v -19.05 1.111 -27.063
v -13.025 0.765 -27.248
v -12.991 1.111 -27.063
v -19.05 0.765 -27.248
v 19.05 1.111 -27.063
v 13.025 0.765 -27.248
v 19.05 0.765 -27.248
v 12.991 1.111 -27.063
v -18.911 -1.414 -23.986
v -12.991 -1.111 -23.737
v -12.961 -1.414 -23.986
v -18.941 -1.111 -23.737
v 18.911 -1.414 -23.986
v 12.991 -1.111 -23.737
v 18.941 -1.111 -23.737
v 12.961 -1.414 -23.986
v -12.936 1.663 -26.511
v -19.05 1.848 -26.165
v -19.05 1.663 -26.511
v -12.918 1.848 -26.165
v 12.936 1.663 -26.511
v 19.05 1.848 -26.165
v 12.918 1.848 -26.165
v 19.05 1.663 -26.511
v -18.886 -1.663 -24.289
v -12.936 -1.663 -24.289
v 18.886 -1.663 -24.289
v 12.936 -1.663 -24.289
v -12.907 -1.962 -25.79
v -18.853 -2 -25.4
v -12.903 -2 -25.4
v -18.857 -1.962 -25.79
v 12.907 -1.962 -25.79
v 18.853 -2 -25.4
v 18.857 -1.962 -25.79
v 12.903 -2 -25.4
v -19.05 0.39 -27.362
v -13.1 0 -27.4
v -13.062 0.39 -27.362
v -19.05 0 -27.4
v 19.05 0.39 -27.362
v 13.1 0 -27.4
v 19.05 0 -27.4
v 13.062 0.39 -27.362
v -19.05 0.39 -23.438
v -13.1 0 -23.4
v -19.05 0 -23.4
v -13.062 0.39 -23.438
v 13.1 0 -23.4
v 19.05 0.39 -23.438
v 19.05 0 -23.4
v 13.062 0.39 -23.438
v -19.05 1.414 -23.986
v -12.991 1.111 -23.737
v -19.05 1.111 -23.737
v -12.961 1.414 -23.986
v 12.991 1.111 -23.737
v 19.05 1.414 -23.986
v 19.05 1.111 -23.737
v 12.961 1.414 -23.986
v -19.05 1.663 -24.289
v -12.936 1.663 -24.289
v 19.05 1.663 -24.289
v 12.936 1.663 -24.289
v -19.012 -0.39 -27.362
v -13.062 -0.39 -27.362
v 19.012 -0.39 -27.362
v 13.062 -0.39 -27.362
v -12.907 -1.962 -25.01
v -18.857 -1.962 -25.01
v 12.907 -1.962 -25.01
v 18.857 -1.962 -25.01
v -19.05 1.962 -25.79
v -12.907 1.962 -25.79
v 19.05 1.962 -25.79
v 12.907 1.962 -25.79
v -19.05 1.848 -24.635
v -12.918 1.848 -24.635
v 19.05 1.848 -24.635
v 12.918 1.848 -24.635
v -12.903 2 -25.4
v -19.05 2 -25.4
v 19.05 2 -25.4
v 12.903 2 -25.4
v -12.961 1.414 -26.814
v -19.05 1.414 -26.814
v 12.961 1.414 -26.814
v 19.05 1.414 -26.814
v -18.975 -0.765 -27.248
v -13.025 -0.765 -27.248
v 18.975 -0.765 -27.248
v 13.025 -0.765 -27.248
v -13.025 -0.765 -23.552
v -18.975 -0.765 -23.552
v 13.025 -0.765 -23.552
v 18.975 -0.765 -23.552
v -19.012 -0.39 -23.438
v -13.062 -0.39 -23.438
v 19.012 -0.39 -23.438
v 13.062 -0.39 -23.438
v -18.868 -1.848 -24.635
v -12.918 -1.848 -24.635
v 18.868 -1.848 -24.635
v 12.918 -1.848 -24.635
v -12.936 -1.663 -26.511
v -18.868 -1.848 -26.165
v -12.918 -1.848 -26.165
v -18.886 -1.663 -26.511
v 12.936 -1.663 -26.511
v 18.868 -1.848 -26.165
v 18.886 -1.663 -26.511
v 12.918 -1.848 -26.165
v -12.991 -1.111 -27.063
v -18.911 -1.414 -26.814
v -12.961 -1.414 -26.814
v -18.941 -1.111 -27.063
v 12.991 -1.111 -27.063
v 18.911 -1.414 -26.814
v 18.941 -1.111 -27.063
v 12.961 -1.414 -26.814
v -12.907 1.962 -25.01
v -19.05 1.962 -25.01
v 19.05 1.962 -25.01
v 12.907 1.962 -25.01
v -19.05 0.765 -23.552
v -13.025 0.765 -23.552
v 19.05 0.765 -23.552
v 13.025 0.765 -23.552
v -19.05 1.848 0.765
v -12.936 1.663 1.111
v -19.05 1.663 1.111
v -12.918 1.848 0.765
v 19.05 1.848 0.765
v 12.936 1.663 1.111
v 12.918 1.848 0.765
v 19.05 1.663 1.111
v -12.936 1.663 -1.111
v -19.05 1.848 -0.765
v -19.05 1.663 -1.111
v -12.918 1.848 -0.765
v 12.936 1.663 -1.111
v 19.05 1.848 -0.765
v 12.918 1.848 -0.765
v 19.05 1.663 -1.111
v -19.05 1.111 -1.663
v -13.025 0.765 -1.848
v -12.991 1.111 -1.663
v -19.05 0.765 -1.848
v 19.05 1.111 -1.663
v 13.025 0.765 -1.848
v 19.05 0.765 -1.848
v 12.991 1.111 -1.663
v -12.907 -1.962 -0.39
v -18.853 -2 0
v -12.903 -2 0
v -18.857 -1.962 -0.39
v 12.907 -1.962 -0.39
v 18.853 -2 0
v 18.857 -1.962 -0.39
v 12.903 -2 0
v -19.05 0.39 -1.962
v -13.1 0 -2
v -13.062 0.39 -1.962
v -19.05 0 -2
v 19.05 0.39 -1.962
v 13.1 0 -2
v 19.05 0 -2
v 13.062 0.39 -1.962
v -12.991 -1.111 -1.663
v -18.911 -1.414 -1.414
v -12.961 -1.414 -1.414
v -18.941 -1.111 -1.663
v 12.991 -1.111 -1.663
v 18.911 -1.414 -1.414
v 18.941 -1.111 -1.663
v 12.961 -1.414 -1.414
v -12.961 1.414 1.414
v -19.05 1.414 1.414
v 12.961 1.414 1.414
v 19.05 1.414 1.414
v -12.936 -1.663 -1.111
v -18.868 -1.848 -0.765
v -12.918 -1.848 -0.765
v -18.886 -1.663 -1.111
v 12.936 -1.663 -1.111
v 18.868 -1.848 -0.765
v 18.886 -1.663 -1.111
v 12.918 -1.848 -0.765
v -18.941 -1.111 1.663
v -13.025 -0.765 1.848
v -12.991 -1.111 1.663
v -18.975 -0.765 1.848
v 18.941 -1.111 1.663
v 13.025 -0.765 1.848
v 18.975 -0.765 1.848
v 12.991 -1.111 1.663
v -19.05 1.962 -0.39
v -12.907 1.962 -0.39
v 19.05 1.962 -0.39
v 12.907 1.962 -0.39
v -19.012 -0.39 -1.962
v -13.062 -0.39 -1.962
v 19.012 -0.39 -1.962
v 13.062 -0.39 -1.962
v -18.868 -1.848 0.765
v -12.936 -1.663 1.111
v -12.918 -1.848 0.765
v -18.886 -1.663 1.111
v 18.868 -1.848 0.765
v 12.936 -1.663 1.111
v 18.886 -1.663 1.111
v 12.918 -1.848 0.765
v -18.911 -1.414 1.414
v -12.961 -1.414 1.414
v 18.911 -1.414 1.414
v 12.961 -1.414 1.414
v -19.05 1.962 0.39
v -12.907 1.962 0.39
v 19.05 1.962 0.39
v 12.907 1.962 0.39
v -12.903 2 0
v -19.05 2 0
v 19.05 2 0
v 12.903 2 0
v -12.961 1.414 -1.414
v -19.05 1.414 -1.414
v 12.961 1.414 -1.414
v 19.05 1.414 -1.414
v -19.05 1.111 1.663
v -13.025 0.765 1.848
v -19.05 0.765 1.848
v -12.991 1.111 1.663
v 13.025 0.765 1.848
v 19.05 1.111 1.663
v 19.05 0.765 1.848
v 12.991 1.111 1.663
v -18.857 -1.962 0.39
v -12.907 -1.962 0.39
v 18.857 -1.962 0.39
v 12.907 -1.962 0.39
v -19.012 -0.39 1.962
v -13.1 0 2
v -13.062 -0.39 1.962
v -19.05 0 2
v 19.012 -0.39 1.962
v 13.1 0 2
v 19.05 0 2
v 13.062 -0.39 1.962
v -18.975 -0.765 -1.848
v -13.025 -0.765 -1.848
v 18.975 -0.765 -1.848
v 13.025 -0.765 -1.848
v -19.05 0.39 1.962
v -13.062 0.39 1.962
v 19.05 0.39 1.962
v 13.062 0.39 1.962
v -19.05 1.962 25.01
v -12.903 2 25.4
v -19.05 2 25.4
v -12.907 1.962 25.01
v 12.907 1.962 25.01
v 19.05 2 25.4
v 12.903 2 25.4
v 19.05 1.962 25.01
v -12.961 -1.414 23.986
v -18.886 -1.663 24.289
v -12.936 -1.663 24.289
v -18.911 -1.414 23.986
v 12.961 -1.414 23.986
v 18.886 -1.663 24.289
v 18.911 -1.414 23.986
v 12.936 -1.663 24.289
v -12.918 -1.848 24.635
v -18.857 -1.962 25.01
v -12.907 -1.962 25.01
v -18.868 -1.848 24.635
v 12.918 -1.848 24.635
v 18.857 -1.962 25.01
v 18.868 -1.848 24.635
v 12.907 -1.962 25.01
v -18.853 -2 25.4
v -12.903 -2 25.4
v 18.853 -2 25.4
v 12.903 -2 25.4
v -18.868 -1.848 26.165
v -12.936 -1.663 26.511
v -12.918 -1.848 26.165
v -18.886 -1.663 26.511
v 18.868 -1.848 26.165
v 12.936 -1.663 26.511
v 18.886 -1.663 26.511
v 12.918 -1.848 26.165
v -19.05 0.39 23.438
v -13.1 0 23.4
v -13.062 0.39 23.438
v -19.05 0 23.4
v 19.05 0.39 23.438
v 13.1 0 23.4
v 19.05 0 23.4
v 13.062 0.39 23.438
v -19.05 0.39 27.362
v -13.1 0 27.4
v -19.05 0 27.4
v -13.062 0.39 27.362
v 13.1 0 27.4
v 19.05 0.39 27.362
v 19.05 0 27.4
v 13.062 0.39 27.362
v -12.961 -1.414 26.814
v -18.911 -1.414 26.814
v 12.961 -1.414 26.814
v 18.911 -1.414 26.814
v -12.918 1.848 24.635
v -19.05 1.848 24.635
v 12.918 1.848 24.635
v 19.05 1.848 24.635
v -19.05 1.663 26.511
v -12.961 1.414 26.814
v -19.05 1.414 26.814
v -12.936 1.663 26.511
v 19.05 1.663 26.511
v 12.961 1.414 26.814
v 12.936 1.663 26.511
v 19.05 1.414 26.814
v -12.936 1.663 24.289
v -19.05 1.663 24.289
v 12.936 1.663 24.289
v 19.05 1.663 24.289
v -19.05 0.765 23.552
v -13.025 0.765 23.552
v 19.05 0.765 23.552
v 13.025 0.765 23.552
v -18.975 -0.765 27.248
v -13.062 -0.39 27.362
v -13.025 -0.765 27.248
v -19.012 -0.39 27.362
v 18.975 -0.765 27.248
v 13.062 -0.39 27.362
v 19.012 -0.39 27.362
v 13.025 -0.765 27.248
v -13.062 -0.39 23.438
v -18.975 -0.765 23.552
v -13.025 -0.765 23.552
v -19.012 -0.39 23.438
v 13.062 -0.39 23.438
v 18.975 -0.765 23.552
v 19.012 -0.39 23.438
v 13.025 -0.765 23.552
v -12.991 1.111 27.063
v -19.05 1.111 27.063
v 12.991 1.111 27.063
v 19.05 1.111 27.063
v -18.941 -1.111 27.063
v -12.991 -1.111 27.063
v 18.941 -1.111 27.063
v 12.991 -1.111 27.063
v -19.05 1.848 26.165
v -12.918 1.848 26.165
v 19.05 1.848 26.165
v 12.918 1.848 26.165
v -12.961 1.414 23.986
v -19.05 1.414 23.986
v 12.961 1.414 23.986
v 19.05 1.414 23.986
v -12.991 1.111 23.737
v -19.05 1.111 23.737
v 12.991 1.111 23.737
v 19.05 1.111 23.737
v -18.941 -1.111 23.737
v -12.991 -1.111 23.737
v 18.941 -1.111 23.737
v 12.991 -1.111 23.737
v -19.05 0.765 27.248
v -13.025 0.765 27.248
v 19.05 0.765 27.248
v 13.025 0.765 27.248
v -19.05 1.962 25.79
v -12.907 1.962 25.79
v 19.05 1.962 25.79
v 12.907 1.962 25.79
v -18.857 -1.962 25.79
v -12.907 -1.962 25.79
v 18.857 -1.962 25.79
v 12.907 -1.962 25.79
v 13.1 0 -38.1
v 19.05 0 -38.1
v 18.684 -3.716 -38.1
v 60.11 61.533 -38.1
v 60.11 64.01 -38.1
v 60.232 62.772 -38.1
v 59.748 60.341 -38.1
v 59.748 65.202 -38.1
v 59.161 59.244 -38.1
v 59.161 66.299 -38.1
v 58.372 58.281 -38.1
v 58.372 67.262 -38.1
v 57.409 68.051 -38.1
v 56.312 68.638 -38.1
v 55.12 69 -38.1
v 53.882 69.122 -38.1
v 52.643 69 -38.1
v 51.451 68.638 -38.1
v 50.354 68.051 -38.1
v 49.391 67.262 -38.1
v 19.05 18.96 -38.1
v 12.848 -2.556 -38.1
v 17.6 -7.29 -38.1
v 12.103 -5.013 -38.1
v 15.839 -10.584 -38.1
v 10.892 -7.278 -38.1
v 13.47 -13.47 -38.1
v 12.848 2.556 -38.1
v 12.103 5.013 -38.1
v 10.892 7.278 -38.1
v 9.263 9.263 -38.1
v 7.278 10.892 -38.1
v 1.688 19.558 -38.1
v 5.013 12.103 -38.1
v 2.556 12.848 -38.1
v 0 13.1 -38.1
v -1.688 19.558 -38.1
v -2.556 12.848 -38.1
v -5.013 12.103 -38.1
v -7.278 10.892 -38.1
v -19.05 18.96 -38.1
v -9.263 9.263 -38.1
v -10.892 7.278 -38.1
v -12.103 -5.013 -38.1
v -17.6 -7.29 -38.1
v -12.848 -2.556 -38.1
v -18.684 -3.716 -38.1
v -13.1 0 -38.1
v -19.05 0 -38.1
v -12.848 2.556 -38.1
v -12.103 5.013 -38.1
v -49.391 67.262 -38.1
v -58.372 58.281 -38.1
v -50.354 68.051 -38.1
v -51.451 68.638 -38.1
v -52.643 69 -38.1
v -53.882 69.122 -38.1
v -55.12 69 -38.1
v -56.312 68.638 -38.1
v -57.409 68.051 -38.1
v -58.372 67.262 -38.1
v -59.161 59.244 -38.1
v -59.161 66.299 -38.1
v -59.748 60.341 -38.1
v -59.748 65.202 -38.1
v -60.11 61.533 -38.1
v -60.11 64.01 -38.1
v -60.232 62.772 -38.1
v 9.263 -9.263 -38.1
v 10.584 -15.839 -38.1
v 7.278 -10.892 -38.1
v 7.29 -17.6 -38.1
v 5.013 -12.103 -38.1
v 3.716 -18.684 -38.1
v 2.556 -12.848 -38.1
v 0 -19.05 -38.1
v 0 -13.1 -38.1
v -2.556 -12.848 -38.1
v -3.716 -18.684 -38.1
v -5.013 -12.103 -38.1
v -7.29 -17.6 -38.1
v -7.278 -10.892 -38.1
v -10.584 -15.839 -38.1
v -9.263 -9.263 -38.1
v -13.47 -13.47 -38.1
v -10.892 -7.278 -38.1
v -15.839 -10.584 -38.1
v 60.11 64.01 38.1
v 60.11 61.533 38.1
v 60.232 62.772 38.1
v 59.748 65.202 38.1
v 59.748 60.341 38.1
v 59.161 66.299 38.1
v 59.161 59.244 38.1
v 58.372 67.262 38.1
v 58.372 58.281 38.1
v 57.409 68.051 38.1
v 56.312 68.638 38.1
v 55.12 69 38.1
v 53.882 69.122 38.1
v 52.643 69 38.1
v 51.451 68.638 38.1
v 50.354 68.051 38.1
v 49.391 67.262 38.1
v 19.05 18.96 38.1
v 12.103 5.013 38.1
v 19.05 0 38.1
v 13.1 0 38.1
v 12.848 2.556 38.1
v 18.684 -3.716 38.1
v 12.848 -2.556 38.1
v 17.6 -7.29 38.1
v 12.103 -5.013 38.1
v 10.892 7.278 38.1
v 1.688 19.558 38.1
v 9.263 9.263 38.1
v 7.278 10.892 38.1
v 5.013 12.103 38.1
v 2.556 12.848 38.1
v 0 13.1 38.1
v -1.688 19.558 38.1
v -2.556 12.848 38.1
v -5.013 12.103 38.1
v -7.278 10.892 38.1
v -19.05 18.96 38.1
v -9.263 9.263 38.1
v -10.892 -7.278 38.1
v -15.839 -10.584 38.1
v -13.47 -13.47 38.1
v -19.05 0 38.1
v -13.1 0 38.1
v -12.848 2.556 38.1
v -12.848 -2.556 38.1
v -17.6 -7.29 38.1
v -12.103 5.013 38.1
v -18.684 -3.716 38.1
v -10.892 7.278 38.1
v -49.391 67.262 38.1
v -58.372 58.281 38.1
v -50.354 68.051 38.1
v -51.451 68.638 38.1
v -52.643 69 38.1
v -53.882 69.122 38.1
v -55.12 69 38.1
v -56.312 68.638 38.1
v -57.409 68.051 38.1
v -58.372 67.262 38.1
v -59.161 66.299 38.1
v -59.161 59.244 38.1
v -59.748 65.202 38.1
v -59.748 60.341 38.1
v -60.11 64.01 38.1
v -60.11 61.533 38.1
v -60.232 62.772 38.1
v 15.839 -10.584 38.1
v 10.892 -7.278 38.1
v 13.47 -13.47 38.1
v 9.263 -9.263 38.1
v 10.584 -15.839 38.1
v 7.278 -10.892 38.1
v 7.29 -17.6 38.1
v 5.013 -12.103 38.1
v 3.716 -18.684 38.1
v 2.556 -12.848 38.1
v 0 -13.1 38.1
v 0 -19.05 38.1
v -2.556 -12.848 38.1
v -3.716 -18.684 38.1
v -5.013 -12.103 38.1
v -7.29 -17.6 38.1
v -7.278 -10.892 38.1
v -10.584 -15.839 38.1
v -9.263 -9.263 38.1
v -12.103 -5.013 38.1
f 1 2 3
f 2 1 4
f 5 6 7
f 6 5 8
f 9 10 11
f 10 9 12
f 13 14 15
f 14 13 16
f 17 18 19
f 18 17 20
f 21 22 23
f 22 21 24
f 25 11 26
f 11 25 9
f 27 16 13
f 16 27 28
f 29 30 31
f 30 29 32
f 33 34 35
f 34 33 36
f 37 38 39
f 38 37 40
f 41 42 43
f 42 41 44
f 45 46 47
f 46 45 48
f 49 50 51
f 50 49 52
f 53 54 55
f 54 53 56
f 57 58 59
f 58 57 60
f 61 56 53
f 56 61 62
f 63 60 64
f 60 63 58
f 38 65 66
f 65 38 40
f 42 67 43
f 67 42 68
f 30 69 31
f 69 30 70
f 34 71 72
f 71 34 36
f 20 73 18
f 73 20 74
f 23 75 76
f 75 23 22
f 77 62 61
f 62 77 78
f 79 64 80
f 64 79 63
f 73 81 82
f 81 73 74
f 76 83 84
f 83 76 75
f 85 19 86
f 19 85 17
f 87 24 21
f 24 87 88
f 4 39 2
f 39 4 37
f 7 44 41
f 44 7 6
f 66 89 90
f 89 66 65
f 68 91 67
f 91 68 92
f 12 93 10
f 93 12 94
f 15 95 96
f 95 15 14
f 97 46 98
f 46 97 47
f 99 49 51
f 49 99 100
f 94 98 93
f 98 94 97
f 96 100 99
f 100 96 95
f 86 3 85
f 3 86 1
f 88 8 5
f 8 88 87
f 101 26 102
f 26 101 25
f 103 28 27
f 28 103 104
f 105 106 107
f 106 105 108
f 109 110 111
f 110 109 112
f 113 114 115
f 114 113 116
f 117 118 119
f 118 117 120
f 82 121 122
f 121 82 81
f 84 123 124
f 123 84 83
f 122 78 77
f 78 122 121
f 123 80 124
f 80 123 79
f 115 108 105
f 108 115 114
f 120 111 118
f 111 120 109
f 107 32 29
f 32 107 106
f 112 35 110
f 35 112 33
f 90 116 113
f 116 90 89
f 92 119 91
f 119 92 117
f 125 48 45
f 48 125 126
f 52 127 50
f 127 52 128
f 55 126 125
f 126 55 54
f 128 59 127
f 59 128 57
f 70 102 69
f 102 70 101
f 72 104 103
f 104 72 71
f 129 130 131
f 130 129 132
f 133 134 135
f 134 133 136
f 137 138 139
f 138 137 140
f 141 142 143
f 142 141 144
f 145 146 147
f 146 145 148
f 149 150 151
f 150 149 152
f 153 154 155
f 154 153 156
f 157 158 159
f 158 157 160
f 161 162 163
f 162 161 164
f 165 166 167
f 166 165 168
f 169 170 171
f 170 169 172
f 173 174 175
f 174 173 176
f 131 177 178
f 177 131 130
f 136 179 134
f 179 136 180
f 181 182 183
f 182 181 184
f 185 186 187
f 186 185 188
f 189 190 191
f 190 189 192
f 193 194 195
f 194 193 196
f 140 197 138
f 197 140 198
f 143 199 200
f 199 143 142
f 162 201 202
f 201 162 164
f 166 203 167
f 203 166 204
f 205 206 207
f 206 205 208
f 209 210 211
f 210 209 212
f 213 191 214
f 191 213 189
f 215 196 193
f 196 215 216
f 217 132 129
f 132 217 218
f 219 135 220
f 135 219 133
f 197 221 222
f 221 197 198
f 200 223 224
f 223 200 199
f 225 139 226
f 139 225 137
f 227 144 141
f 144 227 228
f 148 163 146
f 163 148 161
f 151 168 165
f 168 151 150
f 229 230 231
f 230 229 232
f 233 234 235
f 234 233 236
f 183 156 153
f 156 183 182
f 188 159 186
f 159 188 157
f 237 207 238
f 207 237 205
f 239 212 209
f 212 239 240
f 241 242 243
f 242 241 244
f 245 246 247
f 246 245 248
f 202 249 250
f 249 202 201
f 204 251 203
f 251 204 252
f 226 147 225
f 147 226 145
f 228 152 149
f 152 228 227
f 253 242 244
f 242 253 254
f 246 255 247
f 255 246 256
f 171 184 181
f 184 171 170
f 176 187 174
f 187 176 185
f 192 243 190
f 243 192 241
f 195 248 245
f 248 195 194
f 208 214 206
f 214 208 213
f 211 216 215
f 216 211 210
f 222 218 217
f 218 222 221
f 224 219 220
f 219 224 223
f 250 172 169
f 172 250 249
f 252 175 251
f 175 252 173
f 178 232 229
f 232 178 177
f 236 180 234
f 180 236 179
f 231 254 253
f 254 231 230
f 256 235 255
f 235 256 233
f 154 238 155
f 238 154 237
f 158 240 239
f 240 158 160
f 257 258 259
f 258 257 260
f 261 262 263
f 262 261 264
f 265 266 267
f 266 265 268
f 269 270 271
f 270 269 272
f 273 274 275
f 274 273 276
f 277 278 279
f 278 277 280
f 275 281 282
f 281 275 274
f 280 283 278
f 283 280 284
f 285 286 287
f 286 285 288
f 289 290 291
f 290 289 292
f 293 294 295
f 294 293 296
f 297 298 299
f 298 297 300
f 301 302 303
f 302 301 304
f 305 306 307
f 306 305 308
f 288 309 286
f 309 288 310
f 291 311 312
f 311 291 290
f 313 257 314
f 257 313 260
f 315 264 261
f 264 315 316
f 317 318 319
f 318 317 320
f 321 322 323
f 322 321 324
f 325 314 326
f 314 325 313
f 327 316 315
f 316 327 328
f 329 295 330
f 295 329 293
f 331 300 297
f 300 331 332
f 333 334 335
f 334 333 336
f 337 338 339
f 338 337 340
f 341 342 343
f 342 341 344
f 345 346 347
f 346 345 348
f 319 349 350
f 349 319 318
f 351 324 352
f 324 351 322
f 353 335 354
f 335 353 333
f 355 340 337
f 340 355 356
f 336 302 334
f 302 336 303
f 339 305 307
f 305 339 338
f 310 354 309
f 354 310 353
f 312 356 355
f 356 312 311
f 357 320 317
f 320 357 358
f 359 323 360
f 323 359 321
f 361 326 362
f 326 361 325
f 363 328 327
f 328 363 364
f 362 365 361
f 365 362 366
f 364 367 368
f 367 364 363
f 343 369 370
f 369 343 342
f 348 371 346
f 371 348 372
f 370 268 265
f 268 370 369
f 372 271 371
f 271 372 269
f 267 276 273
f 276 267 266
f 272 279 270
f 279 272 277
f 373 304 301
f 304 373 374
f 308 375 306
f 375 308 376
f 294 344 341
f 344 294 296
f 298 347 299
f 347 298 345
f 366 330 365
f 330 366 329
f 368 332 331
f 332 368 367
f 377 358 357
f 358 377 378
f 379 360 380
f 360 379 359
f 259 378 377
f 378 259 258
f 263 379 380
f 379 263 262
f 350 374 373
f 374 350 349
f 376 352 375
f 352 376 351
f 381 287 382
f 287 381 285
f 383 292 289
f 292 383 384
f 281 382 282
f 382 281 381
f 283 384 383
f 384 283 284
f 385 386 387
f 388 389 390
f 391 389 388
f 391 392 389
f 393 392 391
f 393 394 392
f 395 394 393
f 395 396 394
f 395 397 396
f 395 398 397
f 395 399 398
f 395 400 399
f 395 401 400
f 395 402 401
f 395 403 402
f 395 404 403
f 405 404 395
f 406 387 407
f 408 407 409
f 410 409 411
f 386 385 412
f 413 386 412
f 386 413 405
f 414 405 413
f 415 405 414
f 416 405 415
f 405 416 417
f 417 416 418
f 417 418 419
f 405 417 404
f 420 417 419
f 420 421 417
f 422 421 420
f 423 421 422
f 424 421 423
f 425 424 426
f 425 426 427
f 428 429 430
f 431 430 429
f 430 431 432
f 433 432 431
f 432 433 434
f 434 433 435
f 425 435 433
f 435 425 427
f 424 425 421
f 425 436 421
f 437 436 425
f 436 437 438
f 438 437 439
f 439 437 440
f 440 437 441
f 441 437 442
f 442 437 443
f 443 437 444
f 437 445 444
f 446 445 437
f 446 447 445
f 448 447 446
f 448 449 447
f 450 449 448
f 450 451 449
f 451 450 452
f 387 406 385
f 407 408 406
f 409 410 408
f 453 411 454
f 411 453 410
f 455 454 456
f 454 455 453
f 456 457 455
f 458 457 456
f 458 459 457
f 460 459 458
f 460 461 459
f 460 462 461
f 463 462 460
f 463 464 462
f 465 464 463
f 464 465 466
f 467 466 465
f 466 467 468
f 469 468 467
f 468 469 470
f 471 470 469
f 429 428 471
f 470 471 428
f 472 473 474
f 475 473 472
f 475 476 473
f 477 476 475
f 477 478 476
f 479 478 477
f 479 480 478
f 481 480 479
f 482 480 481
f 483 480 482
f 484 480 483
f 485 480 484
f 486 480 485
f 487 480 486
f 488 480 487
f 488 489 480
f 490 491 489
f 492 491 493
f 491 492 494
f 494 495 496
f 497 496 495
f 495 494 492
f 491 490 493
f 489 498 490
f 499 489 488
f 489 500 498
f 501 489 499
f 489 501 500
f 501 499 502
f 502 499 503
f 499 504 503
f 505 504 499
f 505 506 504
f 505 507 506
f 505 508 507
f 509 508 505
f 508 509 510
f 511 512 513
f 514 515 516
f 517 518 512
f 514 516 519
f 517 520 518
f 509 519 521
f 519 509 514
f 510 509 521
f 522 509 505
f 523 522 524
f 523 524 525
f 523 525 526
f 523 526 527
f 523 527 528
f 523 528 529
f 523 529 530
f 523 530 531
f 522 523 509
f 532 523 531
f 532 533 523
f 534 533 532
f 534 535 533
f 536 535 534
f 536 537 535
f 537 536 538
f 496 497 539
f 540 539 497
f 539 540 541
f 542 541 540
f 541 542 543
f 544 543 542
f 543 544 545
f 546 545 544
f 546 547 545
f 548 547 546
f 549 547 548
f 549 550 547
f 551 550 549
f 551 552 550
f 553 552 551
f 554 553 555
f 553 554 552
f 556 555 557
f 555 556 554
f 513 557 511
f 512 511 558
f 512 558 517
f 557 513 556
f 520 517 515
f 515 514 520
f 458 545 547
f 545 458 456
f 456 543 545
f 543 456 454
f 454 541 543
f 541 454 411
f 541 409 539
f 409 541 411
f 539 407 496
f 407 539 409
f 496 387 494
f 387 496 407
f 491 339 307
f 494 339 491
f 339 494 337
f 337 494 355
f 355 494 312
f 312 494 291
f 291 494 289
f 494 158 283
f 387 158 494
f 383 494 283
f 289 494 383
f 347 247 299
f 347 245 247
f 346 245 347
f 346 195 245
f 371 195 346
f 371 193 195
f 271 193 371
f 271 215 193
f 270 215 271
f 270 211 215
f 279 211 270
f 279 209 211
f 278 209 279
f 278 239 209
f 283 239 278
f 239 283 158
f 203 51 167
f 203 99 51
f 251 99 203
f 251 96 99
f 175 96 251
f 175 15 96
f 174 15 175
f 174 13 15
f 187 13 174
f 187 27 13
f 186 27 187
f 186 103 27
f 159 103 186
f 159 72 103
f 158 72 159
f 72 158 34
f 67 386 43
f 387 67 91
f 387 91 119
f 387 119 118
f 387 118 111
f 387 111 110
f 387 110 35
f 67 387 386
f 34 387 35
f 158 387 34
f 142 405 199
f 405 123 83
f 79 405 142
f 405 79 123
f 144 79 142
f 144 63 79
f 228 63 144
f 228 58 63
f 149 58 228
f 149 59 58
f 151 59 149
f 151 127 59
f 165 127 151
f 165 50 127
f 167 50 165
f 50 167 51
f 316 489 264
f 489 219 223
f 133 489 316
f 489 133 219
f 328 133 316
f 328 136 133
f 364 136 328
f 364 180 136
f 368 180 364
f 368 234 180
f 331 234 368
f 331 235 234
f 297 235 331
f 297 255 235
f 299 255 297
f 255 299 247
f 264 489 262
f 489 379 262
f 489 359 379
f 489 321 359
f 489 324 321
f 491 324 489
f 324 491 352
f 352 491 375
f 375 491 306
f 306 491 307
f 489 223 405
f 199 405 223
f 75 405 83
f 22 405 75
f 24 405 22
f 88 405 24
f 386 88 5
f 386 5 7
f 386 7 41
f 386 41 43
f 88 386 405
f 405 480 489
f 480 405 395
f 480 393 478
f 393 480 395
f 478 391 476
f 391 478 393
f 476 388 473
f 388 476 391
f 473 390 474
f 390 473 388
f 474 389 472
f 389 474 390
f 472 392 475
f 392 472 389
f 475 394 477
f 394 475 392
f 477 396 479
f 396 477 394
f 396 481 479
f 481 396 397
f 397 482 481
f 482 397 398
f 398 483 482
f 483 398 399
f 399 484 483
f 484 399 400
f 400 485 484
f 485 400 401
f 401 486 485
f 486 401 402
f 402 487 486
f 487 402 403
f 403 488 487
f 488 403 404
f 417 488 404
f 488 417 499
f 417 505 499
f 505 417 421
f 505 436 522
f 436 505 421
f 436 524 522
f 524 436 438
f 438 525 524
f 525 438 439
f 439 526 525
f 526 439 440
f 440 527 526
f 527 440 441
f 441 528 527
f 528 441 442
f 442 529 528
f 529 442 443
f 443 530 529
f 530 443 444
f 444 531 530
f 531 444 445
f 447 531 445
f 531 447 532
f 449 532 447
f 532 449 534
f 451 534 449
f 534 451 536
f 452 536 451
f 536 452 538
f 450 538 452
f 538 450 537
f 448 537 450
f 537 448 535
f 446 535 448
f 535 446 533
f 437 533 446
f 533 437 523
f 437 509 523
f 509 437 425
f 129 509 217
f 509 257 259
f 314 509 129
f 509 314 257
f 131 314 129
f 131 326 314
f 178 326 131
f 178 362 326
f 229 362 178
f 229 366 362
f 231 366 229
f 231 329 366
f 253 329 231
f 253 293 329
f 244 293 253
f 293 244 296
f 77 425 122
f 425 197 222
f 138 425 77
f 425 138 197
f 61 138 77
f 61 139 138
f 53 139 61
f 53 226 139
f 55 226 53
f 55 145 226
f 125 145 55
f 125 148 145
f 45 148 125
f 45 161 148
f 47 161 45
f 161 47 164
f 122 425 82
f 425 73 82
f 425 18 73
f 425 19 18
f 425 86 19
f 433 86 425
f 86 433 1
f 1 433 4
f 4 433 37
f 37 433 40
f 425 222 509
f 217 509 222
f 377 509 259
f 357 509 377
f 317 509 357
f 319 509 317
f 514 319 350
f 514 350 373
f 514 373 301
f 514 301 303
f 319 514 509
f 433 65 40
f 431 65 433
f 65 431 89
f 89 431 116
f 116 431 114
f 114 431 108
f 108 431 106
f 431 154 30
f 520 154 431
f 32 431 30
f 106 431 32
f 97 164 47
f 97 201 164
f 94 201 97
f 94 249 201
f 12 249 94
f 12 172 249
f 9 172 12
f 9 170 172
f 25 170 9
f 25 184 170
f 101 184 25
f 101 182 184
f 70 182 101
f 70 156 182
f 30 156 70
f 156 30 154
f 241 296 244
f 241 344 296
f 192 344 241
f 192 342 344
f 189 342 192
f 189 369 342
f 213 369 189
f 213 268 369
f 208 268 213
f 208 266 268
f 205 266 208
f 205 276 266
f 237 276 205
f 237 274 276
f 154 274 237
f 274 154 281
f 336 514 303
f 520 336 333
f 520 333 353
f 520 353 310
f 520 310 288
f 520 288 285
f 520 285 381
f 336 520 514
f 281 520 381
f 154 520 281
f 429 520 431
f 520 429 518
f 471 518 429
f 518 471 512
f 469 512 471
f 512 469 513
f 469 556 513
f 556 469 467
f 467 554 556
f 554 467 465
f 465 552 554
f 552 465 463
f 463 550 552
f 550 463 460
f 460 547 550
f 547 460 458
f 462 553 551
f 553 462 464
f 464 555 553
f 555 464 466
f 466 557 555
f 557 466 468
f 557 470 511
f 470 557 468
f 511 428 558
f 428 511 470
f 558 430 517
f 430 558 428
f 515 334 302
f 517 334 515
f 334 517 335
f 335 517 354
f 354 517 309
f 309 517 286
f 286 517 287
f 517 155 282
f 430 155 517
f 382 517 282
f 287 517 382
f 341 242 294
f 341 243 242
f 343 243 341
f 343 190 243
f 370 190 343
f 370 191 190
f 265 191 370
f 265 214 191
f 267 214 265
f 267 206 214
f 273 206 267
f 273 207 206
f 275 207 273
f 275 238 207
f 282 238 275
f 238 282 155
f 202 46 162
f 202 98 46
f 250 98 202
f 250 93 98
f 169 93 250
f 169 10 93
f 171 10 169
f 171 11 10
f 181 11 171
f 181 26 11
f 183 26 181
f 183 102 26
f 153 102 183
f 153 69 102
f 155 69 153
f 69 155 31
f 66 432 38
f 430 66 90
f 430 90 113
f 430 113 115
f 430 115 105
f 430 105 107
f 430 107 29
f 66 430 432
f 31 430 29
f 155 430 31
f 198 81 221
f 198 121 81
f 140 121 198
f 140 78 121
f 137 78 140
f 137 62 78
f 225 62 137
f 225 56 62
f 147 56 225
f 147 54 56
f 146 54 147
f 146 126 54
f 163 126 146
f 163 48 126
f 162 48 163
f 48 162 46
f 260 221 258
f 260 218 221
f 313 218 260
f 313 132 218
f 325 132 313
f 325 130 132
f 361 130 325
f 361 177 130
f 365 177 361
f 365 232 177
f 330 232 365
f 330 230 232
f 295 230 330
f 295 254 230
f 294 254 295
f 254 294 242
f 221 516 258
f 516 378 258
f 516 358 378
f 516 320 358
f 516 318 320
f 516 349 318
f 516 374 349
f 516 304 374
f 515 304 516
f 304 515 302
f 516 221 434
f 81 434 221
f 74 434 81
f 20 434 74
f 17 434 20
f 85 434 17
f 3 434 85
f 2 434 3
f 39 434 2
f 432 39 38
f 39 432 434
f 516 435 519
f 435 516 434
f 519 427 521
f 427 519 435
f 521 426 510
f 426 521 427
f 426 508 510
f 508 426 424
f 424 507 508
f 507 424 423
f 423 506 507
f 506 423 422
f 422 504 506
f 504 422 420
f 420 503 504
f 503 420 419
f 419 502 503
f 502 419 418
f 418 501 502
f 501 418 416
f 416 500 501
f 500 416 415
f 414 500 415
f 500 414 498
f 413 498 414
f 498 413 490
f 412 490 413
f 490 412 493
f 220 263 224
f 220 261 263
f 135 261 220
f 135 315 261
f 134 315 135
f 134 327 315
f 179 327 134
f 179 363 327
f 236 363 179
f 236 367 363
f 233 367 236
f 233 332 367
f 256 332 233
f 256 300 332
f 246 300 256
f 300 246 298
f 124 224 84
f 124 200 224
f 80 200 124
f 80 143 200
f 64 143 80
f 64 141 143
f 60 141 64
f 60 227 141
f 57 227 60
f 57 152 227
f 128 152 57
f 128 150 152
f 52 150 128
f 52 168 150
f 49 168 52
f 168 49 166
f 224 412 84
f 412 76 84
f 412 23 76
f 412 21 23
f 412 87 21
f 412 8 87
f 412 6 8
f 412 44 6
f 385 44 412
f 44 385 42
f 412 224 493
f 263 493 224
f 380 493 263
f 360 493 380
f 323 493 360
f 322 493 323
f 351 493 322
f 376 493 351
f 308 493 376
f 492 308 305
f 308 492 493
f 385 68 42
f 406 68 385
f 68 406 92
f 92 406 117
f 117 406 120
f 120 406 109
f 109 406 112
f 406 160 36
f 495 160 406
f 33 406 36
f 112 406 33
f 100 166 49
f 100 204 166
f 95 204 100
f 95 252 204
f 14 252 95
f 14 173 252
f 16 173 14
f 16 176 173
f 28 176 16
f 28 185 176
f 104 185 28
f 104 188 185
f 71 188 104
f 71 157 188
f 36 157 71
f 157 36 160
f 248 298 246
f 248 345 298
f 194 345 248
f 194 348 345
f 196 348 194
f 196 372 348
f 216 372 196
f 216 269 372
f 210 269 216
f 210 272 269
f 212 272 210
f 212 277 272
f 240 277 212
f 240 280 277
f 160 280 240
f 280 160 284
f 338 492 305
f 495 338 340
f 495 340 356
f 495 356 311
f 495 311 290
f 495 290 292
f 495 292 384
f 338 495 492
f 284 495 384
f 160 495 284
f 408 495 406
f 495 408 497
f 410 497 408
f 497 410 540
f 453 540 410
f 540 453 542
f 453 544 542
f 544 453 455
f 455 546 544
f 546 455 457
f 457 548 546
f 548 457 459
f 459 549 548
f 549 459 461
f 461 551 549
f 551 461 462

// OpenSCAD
inch = 25.4;
vee_angle = 45;
vee_thickness = 0.5*inch;
vee_length = 3*inch;
vee_offset = 0.35*inch;

module cross_section() {
     h=2.4*inch;
     difference() {
          union() {
               circle(r=1.5*inch/2);
               x = 2.2 * vee_offset;
               translate([0, x/2]) square([1.5*inch, x], center=true);

               // vee
               translate([0, vee_offset])
                    for (i = [+1,-1]) {
                         rotate(i*vee_angle)
                              rotate(90) {
                              translate([0, -vee_thickness/2])
                                   square([vee_length, vee_thickness]);
                              translate([vee_length, 0]) circle(r=vee_thickness/2);
                         }
                    }
          }
          circle(r=1*inch/2 + 0.4);
     }
}

module vee() {
     difference() {
          linear_extrude(3*inch, center=true) cross_section();
          for (z = [-1, 0, 1]*inch) {
               translate([0,0,z]) rotate([0,90,0]) cylinder(r=4/2, h=3*inch, center=true);
          }
     }
}

vee($fn=32);

//rotate([0,90,0]) cylinder(r=4/2, h=45, center=true);
